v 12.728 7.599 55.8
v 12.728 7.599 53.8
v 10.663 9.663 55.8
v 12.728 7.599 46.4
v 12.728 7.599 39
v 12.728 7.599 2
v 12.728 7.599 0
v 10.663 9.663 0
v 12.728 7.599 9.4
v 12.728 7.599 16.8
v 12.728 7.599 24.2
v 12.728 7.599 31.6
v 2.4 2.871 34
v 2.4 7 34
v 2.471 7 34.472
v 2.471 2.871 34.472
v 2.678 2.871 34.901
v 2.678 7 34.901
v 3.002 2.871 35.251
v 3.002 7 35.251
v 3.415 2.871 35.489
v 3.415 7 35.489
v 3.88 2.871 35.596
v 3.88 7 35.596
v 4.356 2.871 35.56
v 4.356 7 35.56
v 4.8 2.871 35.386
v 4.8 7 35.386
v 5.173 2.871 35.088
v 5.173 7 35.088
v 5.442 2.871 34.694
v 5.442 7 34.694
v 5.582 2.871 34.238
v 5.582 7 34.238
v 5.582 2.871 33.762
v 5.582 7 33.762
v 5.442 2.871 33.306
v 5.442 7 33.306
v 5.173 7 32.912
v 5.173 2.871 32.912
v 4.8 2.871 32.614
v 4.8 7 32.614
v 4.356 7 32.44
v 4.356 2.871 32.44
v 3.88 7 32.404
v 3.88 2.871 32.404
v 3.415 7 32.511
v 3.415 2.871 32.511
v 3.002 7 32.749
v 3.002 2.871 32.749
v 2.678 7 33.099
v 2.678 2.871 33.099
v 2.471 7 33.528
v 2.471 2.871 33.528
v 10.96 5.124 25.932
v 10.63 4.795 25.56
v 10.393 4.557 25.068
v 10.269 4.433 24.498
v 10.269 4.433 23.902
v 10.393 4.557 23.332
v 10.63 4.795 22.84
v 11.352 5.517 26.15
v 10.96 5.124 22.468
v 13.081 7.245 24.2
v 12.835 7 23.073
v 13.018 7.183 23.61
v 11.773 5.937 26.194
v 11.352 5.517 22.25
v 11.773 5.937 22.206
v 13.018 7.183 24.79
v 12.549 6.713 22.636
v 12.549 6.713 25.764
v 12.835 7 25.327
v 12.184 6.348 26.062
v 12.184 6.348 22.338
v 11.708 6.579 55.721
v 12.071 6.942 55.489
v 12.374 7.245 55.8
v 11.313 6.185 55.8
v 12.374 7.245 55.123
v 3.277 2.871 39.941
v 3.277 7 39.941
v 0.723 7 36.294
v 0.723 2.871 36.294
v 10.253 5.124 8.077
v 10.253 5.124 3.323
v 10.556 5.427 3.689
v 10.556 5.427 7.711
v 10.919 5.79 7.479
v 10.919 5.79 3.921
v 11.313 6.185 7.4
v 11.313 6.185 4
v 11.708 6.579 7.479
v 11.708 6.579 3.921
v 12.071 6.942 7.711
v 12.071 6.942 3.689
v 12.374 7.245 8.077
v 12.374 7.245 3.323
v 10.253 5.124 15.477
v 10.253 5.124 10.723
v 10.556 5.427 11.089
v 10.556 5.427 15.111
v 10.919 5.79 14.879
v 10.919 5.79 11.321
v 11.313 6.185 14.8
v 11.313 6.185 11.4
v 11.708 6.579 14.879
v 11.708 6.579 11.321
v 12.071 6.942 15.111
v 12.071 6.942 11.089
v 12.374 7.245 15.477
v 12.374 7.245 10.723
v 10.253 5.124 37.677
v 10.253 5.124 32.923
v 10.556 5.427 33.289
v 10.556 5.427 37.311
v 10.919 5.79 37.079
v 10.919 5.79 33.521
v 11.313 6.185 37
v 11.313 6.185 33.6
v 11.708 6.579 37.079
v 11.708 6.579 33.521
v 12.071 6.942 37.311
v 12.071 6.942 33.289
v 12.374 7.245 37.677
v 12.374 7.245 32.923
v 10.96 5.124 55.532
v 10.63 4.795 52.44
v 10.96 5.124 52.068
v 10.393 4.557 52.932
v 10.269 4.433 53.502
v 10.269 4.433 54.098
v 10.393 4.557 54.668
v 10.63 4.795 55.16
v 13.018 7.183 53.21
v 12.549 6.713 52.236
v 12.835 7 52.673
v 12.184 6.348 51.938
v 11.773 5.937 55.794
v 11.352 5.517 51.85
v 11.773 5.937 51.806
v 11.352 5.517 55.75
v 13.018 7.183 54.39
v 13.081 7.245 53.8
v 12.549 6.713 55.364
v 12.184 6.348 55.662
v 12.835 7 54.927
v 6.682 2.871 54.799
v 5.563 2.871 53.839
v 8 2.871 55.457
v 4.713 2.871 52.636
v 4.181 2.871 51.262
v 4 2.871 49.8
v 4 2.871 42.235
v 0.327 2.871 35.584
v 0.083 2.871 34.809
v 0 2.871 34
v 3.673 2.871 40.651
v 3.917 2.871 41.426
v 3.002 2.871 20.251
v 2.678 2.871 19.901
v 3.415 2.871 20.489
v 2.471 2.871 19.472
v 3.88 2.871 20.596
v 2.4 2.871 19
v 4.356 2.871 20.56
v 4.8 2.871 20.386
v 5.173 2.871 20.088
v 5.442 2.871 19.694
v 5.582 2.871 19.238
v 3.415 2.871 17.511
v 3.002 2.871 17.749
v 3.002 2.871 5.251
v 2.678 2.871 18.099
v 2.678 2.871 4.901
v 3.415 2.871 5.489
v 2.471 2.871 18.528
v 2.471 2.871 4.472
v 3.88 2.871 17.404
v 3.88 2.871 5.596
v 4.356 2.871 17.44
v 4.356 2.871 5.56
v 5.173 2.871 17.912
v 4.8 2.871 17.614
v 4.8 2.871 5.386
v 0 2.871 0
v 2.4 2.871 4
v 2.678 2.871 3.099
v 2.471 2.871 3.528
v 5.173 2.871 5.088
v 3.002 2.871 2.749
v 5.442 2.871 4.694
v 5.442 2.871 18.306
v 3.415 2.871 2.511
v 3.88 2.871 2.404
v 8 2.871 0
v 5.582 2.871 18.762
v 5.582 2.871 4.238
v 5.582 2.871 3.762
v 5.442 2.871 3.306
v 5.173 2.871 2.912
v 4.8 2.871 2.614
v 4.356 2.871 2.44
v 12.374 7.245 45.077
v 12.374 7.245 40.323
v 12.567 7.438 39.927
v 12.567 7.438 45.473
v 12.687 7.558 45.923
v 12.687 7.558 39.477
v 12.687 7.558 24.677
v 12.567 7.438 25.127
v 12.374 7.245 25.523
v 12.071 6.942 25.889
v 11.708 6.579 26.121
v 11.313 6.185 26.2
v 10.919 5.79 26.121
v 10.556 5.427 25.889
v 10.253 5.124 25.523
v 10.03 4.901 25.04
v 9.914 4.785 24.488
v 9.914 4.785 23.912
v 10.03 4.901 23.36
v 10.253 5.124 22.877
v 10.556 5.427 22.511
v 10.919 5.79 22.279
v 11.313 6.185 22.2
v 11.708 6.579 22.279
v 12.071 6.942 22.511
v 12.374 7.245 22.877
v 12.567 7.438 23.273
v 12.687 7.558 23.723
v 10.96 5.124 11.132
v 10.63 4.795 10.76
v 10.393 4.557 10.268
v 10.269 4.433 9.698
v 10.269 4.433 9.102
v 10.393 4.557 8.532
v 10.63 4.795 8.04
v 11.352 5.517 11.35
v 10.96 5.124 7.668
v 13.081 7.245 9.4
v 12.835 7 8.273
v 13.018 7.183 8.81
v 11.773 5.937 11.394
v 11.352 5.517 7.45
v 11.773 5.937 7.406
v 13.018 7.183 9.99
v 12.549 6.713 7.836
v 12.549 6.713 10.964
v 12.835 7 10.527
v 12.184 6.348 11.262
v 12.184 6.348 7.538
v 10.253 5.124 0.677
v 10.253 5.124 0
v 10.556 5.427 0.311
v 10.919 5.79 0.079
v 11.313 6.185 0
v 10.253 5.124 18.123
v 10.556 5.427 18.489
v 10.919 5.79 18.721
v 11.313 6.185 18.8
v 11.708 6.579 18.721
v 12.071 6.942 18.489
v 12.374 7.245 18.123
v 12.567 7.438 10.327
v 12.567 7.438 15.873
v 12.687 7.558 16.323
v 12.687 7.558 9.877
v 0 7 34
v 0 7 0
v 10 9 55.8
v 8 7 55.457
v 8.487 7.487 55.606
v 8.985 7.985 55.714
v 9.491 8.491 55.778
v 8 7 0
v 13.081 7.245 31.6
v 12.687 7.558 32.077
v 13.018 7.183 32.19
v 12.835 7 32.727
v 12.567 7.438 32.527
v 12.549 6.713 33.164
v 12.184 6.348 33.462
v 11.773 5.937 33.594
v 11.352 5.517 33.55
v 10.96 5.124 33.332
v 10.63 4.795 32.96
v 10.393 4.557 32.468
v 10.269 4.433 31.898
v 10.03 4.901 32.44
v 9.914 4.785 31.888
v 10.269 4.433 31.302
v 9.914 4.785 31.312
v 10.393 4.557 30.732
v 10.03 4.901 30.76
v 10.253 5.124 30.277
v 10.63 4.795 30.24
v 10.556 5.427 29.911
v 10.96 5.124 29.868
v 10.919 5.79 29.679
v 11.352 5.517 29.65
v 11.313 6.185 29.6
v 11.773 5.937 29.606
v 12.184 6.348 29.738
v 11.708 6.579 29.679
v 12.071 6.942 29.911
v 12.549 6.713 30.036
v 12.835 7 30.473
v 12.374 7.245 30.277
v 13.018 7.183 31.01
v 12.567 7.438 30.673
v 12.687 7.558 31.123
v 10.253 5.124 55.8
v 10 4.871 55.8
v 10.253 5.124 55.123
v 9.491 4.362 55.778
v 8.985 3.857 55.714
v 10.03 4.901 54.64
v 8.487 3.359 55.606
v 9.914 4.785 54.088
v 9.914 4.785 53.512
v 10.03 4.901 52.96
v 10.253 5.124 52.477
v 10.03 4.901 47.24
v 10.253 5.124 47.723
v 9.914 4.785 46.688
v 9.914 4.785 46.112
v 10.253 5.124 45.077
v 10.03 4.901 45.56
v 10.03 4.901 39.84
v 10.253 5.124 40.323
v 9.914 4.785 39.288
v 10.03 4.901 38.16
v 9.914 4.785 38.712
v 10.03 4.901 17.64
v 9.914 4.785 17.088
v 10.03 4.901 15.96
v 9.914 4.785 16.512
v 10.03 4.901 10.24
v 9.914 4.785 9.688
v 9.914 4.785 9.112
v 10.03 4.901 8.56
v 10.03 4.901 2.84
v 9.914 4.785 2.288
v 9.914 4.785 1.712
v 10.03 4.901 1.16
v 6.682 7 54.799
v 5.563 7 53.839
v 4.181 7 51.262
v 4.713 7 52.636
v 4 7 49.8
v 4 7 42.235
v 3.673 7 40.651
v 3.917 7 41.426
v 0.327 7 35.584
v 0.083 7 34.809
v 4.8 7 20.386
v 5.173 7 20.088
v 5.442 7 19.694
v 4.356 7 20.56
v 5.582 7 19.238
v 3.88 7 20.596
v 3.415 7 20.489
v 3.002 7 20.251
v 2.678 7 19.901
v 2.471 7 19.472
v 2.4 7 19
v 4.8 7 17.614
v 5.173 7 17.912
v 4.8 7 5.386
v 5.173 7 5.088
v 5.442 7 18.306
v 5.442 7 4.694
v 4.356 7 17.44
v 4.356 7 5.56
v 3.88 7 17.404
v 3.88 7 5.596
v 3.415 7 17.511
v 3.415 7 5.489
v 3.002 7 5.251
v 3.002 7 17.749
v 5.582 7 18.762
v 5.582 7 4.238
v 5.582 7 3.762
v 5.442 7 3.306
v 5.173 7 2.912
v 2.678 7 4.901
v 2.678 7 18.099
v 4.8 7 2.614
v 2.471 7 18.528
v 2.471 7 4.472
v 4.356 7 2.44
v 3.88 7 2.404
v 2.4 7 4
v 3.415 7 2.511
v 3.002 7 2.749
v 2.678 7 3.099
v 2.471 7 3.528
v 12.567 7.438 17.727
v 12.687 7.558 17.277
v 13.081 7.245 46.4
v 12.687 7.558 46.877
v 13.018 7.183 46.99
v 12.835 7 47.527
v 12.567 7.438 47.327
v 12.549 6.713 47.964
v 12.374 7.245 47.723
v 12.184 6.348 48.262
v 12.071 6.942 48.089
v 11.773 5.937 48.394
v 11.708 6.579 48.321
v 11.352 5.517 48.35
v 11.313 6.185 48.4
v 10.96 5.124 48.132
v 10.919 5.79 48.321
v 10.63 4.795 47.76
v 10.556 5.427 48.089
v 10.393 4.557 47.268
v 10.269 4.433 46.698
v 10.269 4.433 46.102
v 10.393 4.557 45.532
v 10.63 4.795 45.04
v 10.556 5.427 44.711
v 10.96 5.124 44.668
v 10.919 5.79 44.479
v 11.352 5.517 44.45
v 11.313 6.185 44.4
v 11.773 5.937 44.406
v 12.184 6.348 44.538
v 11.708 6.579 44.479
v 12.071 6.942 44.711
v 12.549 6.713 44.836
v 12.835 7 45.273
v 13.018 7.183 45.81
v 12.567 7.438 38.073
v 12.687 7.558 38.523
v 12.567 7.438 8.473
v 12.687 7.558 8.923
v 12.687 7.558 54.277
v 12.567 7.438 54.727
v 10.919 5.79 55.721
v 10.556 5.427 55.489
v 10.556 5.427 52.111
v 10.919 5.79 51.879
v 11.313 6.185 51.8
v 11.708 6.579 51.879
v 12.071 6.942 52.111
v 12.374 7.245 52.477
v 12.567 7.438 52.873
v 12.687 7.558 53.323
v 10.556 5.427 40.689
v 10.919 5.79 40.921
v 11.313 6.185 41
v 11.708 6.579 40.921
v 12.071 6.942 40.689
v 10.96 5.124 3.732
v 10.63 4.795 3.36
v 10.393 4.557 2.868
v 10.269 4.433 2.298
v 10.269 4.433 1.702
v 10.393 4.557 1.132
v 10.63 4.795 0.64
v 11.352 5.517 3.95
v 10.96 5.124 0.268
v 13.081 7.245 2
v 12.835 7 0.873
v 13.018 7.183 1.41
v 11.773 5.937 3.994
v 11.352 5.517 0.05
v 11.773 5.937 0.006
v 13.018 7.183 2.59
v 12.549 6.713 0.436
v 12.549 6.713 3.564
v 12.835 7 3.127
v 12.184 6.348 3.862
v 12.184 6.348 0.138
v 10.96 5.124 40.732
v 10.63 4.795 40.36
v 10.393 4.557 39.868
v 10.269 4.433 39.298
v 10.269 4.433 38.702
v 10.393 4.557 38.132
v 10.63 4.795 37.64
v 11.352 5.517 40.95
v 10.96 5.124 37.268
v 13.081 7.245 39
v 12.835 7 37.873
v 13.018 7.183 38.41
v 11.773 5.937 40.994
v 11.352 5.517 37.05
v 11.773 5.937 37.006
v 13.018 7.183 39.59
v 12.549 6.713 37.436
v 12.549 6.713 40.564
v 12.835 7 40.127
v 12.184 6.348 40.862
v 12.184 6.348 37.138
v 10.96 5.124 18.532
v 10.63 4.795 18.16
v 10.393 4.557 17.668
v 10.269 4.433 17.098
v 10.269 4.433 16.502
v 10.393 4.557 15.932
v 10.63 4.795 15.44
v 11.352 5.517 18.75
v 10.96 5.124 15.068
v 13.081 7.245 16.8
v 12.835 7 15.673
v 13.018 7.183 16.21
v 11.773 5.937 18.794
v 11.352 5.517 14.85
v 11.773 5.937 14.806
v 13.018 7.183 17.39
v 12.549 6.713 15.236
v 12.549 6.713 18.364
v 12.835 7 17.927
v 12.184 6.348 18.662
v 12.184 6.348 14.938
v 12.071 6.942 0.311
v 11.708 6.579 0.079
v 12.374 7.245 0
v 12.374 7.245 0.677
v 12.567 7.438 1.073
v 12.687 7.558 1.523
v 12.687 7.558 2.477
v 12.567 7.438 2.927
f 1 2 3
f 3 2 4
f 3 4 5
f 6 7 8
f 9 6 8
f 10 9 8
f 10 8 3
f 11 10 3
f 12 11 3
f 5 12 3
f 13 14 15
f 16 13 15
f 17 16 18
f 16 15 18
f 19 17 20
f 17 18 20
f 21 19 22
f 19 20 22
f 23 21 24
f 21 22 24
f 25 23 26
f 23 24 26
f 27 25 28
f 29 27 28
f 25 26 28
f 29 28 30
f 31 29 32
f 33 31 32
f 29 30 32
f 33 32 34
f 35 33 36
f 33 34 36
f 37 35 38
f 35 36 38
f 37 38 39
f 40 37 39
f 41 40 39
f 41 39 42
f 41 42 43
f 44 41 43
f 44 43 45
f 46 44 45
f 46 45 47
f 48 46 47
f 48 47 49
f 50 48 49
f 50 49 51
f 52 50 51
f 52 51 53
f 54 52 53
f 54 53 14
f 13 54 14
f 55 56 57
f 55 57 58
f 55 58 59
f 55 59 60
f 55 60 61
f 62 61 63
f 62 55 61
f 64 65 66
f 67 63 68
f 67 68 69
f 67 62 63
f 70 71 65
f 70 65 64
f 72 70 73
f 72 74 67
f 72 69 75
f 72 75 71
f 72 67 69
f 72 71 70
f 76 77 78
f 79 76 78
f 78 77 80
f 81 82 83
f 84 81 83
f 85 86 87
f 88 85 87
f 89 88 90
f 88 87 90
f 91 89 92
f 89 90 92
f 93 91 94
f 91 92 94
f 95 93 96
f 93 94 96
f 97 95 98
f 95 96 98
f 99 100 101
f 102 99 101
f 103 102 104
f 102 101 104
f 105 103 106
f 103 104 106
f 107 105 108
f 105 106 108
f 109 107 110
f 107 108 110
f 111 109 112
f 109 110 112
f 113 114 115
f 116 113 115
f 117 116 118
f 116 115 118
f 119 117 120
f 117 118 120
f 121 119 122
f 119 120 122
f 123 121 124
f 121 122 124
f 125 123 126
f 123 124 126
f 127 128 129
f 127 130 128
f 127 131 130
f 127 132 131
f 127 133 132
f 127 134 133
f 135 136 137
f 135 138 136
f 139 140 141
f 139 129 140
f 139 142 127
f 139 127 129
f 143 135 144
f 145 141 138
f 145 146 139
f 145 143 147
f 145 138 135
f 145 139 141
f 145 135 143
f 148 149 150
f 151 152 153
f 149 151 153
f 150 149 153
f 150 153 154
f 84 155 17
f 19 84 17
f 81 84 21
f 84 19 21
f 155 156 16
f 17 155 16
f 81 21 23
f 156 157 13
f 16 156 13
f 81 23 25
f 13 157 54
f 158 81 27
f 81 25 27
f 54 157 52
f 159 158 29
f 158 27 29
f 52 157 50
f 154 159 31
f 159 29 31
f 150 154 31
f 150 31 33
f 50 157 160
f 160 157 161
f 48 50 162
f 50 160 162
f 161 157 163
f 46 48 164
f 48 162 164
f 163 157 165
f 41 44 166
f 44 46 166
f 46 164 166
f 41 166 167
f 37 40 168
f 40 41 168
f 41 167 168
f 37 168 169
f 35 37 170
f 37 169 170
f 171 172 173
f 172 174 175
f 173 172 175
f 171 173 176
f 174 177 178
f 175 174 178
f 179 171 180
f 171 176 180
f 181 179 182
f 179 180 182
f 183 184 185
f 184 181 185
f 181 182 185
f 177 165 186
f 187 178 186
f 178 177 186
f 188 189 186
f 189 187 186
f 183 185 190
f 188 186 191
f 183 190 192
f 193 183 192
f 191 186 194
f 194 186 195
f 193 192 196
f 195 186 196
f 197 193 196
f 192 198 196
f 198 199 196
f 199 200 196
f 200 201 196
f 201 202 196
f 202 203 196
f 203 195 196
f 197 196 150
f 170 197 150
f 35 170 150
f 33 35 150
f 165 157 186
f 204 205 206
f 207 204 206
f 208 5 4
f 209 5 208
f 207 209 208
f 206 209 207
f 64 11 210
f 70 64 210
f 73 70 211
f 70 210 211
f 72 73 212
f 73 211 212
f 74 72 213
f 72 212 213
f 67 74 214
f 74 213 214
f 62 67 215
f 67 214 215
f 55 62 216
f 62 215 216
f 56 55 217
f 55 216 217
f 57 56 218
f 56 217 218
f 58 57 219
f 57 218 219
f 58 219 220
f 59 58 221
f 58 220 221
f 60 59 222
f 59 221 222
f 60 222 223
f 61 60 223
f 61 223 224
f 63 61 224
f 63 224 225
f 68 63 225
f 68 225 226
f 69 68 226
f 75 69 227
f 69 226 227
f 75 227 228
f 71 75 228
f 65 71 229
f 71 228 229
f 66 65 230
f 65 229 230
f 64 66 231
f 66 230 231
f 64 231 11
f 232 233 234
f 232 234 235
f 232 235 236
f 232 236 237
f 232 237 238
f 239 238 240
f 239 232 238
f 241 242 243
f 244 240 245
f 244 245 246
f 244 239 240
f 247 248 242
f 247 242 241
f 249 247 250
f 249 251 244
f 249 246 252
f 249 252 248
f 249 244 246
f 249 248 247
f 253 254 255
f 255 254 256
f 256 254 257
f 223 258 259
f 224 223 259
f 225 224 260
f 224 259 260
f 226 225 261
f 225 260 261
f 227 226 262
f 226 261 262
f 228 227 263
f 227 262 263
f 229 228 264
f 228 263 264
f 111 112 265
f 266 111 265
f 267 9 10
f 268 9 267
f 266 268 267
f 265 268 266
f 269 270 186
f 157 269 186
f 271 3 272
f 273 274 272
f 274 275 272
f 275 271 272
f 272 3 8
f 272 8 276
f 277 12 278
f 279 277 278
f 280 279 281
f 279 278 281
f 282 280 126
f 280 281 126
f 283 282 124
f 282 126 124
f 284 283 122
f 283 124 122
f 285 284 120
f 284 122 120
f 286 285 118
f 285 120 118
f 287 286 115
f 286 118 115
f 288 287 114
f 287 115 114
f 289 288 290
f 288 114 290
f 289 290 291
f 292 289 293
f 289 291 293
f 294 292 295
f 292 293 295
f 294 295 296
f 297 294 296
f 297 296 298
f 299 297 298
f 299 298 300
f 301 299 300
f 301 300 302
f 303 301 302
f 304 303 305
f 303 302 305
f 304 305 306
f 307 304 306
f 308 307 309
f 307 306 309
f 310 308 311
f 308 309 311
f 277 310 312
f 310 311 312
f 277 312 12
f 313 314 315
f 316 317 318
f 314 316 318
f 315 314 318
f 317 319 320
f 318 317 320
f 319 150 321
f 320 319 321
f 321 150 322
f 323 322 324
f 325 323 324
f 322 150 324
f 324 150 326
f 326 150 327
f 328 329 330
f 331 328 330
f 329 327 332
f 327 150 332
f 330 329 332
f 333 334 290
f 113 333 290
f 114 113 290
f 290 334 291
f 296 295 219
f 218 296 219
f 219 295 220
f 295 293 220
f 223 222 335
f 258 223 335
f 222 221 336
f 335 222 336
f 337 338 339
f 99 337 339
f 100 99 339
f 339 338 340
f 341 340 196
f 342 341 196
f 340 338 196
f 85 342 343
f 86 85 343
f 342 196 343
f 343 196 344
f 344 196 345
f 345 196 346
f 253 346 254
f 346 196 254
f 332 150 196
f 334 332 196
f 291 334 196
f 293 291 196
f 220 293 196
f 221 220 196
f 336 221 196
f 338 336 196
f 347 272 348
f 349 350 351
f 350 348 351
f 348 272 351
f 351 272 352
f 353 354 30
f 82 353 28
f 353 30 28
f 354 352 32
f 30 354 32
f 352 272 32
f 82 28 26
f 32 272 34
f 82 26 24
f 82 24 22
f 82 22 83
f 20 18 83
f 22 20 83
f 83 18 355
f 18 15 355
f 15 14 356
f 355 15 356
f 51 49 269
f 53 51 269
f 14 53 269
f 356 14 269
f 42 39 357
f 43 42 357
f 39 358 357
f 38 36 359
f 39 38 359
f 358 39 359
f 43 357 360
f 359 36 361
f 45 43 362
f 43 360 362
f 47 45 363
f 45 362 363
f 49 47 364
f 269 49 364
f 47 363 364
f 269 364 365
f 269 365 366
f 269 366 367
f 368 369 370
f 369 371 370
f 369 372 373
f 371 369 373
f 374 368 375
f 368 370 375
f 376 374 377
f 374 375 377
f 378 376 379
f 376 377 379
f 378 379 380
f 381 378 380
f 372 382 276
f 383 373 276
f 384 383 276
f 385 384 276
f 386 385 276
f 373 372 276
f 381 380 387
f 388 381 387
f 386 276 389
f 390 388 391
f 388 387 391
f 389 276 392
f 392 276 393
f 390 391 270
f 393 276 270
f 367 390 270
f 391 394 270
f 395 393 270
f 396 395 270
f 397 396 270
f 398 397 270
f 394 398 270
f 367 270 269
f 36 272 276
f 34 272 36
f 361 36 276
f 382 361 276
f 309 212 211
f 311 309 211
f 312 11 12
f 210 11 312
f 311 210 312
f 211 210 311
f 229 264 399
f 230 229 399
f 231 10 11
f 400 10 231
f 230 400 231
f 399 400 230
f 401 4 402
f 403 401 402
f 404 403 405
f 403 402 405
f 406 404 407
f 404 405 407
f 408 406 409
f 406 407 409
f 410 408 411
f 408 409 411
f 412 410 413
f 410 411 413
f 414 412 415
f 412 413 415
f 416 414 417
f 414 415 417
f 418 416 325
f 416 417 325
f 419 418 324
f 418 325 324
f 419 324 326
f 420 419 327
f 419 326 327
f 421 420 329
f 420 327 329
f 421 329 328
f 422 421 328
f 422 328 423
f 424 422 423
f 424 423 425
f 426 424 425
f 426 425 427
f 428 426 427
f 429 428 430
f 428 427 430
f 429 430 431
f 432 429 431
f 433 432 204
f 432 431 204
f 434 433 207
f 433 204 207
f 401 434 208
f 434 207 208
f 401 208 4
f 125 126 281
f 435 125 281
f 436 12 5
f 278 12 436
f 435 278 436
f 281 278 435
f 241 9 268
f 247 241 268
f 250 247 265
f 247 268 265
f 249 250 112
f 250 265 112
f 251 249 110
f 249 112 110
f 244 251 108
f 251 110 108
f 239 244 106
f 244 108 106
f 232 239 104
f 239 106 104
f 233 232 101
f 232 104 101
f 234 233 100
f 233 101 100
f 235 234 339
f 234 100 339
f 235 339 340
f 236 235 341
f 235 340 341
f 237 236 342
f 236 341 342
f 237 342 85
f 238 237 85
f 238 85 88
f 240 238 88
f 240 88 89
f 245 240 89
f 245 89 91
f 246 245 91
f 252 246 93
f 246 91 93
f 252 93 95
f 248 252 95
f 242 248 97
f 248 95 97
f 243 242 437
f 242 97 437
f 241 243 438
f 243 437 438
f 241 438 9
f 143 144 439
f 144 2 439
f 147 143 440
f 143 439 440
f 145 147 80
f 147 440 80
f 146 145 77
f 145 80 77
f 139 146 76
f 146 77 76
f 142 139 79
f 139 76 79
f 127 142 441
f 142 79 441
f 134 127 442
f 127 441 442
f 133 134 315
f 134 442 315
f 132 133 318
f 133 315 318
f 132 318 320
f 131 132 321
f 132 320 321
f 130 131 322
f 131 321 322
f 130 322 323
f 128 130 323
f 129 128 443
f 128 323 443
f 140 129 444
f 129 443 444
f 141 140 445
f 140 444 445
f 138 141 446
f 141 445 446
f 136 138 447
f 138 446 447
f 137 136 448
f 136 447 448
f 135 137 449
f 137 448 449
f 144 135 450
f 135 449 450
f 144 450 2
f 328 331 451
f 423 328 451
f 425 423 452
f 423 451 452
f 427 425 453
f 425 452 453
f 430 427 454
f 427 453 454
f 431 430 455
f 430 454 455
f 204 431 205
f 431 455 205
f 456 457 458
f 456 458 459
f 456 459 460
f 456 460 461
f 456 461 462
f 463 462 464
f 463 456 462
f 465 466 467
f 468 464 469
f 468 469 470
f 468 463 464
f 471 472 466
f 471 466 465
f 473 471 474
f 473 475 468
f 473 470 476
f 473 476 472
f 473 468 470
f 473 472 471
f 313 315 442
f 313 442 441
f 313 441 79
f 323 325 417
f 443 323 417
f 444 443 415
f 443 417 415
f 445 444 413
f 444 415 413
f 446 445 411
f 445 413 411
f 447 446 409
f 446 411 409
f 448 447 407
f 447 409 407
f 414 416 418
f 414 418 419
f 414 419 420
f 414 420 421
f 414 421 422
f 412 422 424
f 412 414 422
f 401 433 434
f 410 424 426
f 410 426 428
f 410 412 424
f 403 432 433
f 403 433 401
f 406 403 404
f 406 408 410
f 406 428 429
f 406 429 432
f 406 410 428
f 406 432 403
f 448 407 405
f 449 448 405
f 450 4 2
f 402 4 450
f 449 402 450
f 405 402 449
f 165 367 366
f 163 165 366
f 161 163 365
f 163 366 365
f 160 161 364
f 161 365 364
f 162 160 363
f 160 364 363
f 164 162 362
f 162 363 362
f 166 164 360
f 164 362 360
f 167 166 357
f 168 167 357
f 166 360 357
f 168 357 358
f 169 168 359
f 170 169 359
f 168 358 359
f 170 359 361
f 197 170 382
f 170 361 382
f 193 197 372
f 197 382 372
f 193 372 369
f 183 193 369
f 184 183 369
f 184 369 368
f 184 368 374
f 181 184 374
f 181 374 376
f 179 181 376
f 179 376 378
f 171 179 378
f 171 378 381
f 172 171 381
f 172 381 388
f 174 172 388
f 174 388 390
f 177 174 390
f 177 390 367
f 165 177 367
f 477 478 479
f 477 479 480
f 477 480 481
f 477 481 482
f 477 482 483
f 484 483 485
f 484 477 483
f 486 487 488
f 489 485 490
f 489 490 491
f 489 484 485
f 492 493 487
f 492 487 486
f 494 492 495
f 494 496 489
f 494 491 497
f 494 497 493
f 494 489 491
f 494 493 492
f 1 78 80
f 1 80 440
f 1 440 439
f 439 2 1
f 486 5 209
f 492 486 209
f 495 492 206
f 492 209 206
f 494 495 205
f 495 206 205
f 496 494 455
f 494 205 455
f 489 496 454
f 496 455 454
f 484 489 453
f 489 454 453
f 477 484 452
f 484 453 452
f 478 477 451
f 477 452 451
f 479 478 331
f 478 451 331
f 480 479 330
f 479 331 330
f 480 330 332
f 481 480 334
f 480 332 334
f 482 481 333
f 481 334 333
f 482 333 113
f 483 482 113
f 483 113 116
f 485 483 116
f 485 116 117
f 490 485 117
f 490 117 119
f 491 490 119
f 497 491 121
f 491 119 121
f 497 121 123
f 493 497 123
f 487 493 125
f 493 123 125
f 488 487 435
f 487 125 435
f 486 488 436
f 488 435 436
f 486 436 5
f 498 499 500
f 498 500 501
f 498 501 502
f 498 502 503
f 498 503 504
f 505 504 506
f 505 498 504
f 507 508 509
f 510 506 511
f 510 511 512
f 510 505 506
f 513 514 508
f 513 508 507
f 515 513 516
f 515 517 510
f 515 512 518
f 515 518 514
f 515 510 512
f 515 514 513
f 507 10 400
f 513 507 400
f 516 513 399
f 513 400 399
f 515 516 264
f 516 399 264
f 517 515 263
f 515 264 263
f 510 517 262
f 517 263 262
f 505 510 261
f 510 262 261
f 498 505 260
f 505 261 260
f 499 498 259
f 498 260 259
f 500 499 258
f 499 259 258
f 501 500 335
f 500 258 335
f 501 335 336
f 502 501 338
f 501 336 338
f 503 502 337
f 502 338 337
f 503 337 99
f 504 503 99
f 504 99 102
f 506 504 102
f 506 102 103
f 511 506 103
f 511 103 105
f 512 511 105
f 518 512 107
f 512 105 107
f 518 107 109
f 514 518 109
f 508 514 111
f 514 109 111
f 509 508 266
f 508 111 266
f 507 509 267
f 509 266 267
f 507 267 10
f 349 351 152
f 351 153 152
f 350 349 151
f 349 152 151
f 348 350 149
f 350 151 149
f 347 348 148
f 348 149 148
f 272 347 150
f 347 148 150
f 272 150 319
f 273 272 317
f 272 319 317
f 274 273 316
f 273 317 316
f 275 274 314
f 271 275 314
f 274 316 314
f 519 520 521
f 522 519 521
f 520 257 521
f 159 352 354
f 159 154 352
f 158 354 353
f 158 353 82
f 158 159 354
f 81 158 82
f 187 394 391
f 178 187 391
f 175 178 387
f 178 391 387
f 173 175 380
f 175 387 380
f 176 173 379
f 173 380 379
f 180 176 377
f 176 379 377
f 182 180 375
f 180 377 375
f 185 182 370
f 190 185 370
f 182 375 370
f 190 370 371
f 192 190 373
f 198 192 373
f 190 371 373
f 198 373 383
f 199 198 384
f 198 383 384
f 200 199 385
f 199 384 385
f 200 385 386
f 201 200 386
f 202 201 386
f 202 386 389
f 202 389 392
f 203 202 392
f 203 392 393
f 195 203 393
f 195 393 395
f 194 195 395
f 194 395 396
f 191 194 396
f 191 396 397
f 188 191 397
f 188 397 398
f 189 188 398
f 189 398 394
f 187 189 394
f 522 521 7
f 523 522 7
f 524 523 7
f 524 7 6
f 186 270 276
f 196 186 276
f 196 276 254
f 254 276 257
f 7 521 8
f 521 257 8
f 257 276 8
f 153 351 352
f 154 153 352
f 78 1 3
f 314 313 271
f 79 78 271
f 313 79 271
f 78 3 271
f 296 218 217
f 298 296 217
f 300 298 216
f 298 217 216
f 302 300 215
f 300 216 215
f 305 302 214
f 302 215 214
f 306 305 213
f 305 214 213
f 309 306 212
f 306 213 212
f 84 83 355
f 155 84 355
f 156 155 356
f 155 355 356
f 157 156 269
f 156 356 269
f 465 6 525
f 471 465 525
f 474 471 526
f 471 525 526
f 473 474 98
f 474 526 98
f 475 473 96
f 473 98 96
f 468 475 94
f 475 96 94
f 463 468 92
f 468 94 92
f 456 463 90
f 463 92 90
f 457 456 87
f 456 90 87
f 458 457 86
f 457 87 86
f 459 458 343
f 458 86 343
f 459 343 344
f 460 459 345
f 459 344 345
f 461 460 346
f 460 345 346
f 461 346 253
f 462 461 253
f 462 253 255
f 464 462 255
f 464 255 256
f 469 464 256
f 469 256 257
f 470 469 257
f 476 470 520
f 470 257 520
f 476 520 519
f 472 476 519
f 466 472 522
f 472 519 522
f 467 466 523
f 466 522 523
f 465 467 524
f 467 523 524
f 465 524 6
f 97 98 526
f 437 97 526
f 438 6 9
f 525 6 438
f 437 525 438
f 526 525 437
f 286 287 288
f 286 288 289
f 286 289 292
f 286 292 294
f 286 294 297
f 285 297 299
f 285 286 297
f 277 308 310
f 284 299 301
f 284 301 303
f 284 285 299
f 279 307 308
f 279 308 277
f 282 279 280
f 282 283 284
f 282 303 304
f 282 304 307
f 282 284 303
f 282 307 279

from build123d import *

# Parameters (mm, degrees)
EXTRUDE_1_DEPTH        = 63.5
SKETCH_2_R             = 2
EXTRUDE_4_DEPTH        = 0.5
PATTERN_LINEAR_2_COUNT = 9
PATTERN_LINEAR_2_PITCH = 7.4
SKETCH_4_R             = 1.6
CUT_EXTRUDE_1_DEPTH    = 10.5
PATTERN_LINEAR_3_COUNT = 3
PATTERN_LINEAR_3_PITCH = 15
CUT_EXTRUDE_2_DEPTH    = 20
FILLET_1_R             = 6
FILLET_2_R             = 4


with BuildPart() as part:
    # 草图1 → 凸台-拉伸1 (new body)
    with BuildSketch(Plane.XY):
        Polygon((12.374107166, 7.245427509), (12.727660556, 7.5989809), (10.663320728, 9.663320728), (8, 7), (0, 7), (0, 2.871320344), (8, 2.871320344), (10.252786822, 5.124107166), align=None)
    extrude(amount=EXTRUDE_1_DEPTH)

    # 草图2 → 凸台-拉伸4 (add)
    with BuildSketch(Plane(origin=(2.564339828, -2.564339828, 0), x_dir=(0, 0, -1), z_dir=(0.7071067811865562, -0.7071067811865389, 0))):
        with Locations(Location((-2, 12.373106012, 0), (0, 0, 90))):
            Circle(SKETCH_2_R)
    extrude_4 = extrude(amount=EXTRUDE_4_DEPTH)

    # 阵列(线性)2: 凸台-拉伸4 ×9
    with Locations(*[(0, 0, i * PATTERN_LINEAR_2_PITCH) for i in range(1, PATTERN_LINEAR_2_COUNT)]):
        add(extrude_4)

    # 草图4 → 切除-拉伸1 (cut)
    with BuildSketch(Plane(origin=(0, 7, 0), x_dir=(1, 0, 0), z_dir=(0, 1, 0))):
        with Locations(Location((4, -4, 0), (0, 0, 180))):
            Circle(SKETCH_4_R)
    cut_extrude_1 = extrude(amount=-CUT_EXTRUDE_1_DEPTH, mode=Mode.SUBTRACT)

    # 阵列(线性)3: 切除-拉伸1 ×3
    with Locations(*[(0, 0, i * PATTERN_LINEAR_3_PITCH) for i in range(1, PATTERN_LINEAR_3_COUNT)]):
        add(cut_extrude_1, mode=Mode.SUBTRACT)

    # 草图5 → 切除-拉伸2 (cut, symmetric)
    with BuildSketch(Plane(origin=(0, 7, 0), x_dir=(1, 0, 0), z_dir=(0, 1, 0))):
        with BuildLine():
            Line((4, -40.973787182), (0.723391823, -36.294305745))
            ThreePointArc((0.723391823, -36.294305745), (0.185132197, -35.202823198), (0, -34))
            Line((0, -34), (-5.450044849, -34))
            Line((-5.450044849, -34), (-5.450044849, -68.07872052))
            Line((-5.450044849, -68.07872052), (16.294093075, -68.07872052))
            Line((16.294093075, -68.07872052), (16.294093075, -55.8))
            Line((16.294093075, -55.8), (4, -55.8))
            Line((4, -55.8), (4, -40.973787182))
        make_face()
    extrude(amount=CUT_EXTRUDE_2_DEPTH, both=True, mode=Mode.SUBTRACT)

    # 圆角1
    fillet_1_edges = [part.edges().sort_by_distance(p)[0] for p in [
        (4, 4.935660172, 55.8),
    ]]
    fillet(fillet_1_edges, radius=FILLET_1_R)

    # 圆角2
    fillet_2_edges = [part.edges().sort_by_distance(p)[0] for p in [
        (4, 4.935660172, 40.973787182),
    ]]
    fillet(fillet_2_edges, radius=FILLET_2_R)


solid = part.part
